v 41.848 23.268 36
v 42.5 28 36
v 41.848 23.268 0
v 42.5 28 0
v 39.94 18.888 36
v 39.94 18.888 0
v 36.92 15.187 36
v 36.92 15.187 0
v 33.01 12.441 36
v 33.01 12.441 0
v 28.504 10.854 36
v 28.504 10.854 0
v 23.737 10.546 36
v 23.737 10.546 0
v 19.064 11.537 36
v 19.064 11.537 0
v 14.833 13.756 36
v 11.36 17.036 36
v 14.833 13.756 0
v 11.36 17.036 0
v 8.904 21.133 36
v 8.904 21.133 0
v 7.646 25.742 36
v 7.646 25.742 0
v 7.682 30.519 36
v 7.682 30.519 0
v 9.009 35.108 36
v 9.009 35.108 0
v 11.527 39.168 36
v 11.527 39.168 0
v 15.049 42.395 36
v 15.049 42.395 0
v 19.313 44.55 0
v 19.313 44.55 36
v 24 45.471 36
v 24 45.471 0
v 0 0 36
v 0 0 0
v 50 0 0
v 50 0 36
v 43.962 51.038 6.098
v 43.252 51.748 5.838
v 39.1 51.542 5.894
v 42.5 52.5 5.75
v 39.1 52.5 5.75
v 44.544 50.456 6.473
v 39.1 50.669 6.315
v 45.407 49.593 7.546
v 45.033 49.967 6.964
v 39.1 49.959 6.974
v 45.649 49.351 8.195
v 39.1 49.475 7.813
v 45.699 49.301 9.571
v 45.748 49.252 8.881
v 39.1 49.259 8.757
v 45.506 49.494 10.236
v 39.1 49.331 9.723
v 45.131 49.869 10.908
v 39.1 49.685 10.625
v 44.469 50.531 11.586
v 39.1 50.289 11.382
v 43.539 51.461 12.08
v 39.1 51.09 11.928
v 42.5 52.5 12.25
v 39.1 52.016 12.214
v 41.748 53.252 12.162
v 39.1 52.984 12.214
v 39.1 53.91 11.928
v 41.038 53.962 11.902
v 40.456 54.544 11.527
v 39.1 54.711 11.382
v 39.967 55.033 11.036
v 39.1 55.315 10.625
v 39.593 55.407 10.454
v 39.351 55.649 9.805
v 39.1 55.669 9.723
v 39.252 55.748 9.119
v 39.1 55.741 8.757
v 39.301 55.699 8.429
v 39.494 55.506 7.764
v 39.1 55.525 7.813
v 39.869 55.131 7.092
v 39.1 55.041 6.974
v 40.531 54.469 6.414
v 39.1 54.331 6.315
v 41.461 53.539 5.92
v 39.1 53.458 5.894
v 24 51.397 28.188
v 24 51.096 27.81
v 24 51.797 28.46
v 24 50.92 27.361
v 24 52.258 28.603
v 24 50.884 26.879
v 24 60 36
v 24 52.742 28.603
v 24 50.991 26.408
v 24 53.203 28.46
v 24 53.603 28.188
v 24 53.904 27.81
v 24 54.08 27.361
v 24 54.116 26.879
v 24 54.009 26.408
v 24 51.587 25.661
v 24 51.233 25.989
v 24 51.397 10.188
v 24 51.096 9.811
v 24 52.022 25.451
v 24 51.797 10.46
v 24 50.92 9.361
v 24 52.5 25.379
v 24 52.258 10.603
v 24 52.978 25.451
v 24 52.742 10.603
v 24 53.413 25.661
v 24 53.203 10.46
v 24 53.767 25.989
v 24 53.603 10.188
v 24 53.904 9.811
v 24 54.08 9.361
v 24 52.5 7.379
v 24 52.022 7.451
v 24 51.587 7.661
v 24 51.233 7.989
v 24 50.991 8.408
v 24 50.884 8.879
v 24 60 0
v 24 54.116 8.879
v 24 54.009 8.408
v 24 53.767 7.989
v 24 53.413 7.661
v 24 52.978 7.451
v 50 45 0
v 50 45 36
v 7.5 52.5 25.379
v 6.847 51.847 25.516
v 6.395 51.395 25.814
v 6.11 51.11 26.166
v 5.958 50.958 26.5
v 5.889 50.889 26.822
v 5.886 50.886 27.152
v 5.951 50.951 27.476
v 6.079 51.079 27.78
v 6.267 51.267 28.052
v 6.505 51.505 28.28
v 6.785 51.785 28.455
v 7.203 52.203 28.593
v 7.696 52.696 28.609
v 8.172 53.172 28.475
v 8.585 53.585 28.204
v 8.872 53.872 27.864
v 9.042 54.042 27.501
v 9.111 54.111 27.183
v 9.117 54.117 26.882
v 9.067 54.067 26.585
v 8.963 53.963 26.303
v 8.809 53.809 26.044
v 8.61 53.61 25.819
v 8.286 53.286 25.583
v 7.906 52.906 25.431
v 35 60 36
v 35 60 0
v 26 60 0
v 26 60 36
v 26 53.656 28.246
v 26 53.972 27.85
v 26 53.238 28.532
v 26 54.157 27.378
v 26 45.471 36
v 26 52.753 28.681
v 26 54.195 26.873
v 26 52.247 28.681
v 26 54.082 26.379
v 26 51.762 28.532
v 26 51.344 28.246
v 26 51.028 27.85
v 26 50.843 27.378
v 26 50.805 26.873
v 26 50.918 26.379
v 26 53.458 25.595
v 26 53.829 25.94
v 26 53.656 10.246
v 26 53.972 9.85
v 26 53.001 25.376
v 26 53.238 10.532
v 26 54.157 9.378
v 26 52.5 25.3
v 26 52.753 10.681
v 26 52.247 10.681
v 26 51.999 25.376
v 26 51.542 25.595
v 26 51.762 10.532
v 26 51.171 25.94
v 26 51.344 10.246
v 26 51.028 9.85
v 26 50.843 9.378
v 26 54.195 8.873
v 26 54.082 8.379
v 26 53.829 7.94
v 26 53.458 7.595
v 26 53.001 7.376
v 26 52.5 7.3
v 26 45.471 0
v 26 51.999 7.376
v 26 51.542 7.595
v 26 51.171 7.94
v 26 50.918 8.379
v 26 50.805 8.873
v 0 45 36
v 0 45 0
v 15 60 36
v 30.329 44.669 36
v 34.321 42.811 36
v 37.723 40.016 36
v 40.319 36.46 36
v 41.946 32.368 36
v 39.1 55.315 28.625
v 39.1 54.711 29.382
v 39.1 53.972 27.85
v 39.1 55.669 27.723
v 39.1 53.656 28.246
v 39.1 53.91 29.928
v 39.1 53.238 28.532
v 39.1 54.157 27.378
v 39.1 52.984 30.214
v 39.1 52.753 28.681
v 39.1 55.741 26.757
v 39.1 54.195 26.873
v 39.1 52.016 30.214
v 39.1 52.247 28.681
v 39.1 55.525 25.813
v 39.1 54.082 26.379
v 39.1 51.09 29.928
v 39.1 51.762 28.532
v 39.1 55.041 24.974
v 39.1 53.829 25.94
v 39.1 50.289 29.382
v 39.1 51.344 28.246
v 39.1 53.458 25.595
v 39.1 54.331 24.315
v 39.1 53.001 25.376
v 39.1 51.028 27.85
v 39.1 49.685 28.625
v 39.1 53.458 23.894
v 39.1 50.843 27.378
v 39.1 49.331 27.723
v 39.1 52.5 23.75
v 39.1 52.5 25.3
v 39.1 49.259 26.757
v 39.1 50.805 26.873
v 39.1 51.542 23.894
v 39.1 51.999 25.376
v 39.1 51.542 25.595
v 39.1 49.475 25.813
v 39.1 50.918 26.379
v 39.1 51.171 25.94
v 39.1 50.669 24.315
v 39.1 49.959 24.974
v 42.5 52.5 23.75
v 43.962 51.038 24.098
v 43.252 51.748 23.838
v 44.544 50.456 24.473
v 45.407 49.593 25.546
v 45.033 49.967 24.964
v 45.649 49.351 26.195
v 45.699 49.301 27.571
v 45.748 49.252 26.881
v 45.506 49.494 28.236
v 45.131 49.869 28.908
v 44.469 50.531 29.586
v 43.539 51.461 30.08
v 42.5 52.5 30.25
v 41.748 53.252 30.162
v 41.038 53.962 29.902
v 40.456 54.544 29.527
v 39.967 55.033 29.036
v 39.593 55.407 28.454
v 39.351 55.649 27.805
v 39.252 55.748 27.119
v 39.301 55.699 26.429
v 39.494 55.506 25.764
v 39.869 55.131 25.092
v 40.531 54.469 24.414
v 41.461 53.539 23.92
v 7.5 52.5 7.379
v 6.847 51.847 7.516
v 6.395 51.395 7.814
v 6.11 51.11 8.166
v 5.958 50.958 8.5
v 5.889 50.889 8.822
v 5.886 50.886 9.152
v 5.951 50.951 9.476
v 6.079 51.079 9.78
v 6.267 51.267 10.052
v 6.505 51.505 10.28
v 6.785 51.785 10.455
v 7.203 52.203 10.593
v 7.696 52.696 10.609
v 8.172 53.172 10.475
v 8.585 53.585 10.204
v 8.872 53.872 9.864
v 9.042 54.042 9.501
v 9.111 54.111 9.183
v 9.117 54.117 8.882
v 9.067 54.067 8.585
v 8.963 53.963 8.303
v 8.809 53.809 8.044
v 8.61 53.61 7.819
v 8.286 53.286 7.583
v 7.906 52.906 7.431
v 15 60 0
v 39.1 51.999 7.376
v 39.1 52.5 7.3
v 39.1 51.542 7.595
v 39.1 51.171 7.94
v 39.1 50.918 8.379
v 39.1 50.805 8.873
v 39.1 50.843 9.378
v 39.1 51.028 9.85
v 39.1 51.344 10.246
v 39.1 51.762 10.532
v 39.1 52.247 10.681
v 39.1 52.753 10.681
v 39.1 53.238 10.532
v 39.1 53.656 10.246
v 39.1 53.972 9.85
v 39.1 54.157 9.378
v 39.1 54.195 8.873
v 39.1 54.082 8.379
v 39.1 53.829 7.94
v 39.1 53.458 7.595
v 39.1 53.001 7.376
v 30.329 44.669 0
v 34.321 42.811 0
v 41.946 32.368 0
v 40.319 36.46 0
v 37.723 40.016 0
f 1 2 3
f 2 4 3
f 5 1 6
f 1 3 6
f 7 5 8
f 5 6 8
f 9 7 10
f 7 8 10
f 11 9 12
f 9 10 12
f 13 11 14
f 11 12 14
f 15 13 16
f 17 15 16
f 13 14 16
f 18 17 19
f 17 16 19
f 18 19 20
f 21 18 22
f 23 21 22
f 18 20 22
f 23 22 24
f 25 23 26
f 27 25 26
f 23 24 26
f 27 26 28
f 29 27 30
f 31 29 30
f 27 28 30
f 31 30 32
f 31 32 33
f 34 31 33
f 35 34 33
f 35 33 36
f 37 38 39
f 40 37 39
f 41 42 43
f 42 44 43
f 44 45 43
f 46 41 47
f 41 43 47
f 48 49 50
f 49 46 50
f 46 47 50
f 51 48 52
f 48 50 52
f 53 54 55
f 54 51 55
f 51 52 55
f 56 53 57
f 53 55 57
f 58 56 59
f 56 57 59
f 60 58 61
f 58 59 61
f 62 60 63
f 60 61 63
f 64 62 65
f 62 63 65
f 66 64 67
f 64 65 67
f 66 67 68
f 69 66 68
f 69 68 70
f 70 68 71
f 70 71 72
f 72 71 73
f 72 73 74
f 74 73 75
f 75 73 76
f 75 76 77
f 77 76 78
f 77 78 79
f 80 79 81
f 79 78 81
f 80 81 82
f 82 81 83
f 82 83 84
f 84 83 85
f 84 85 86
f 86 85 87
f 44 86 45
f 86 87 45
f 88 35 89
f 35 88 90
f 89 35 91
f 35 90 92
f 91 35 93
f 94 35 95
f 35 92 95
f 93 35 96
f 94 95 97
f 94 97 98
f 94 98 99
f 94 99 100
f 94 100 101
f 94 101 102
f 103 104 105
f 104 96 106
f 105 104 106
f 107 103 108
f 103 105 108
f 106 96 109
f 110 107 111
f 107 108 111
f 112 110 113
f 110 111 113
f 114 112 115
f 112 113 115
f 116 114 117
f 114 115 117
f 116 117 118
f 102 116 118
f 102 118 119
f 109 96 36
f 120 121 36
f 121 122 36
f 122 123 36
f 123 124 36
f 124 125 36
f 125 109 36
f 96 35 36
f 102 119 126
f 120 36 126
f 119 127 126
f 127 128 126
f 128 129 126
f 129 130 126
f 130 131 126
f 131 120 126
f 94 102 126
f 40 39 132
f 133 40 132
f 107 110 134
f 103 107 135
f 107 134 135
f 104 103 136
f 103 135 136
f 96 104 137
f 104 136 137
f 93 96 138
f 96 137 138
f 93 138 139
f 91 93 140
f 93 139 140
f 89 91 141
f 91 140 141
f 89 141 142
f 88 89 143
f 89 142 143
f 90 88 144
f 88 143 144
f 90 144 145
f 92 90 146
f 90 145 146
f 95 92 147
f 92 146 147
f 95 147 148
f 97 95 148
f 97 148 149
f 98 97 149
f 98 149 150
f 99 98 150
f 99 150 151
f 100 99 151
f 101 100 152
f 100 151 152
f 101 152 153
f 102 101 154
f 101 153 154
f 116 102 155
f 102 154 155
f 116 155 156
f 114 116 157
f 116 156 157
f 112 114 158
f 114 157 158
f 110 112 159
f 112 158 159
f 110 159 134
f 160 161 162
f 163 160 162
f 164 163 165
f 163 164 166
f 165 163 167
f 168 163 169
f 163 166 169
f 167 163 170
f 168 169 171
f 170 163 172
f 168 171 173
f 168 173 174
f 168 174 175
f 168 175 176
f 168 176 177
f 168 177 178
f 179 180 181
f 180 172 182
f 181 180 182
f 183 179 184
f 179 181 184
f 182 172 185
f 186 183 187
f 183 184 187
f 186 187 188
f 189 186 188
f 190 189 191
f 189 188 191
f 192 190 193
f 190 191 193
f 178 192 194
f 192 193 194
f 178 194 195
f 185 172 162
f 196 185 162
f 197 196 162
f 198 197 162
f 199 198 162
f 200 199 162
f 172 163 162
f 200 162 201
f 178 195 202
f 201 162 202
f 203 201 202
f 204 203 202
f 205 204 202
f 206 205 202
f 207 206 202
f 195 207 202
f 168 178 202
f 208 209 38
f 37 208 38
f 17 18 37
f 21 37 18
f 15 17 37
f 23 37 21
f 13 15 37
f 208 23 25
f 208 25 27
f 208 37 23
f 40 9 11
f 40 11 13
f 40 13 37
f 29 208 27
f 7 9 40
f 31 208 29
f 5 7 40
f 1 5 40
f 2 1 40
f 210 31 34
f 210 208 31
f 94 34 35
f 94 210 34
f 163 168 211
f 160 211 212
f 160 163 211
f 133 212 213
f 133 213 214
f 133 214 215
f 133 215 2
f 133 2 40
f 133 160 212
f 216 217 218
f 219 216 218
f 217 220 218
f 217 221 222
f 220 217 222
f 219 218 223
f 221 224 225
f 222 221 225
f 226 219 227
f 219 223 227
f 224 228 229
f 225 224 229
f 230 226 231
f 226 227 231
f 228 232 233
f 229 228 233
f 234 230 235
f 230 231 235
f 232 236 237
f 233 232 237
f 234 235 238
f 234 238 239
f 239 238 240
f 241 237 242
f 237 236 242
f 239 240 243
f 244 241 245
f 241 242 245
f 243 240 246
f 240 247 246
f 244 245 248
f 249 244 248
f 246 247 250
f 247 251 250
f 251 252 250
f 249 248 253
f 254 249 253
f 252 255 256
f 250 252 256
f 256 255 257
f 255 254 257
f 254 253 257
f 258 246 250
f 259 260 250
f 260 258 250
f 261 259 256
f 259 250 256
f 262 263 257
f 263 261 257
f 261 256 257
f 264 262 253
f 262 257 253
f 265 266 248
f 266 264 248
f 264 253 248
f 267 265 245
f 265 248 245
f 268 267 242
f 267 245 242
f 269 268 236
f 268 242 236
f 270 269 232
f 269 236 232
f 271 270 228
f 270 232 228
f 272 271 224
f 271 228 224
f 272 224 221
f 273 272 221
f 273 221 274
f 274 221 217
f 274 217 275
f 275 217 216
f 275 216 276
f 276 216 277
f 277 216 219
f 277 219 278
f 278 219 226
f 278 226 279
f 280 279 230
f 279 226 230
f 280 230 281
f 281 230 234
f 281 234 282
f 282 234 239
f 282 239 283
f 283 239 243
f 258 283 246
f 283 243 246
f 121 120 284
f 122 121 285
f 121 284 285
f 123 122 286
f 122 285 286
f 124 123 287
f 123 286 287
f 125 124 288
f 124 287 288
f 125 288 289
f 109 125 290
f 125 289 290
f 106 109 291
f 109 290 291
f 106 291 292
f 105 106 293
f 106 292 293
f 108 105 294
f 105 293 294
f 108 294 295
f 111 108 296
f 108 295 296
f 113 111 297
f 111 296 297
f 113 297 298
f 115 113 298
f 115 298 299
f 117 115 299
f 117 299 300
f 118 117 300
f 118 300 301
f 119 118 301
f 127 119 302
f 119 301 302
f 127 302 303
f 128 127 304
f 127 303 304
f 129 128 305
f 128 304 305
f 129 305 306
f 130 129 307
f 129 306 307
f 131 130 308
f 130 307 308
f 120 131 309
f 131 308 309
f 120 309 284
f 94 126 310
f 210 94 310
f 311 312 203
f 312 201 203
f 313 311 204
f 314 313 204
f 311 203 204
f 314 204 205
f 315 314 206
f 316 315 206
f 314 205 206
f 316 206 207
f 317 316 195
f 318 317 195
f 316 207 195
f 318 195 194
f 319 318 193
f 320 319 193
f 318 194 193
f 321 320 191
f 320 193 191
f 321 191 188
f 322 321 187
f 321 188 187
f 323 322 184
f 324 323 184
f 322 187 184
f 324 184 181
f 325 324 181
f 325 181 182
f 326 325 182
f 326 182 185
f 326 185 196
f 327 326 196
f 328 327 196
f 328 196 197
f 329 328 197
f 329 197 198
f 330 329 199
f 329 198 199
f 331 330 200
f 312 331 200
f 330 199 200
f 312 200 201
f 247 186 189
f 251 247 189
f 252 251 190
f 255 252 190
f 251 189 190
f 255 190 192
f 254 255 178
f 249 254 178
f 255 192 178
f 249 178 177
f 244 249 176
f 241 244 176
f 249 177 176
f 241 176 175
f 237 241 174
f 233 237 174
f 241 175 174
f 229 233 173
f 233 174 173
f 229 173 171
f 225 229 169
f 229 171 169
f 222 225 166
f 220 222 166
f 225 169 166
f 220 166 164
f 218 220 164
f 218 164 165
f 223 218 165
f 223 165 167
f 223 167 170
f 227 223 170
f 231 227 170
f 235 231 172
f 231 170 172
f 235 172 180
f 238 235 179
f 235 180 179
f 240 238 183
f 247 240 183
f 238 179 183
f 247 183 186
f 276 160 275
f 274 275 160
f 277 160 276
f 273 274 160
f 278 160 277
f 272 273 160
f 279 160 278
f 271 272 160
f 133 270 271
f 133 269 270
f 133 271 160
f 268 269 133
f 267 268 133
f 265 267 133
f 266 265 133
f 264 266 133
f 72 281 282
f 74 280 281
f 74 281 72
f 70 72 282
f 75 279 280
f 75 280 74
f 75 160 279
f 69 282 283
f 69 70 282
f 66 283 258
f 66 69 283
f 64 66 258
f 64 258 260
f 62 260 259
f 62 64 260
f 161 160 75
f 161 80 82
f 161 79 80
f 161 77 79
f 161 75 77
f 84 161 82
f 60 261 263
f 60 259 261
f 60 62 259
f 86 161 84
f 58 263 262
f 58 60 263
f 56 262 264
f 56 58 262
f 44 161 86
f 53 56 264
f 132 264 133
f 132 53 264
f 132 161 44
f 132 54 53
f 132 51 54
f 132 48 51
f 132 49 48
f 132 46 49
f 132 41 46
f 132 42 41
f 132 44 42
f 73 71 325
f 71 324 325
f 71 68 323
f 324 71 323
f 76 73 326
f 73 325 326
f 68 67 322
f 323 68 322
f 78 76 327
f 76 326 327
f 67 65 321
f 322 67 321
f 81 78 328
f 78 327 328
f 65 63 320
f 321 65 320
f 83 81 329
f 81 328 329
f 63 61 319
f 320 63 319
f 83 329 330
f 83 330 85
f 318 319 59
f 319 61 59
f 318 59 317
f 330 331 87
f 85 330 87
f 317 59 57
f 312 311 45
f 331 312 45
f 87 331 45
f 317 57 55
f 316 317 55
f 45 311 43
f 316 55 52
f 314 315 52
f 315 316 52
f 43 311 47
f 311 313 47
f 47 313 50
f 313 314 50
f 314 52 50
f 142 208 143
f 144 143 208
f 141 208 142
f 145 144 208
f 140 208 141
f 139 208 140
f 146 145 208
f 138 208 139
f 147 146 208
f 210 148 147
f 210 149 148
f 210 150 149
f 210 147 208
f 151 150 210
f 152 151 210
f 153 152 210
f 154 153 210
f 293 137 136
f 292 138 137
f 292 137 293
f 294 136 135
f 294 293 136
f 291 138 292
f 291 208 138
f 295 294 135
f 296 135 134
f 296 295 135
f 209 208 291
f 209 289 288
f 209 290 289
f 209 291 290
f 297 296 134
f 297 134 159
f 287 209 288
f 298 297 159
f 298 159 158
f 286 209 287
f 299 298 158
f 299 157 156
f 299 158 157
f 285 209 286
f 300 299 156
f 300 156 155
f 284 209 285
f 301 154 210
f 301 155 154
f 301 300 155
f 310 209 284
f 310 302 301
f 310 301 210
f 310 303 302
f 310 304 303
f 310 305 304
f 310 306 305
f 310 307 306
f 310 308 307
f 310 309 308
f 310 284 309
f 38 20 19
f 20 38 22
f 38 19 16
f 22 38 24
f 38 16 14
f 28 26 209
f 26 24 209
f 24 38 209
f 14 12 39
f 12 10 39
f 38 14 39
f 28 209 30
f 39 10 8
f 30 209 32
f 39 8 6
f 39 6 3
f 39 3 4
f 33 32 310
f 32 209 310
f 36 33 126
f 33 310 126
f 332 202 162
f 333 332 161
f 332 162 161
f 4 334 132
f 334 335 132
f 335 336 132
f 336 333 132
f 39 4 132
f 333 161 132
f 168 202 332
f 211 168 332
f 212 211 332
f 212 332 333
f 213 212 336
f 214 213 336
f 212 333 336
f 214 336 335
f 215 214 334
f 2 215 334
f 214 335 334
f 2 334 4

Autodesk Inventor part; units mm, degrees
sketch "Skizze1" plane through (0, 0, 0) normal (0, 0, 1) x (1, 0, 0)
  line L0 (0, 0) -> (50, 0)
  line L1 (50, 0) -> (50, 45)
  line L2 (35, 60) -> (15, 60)
  line L3 (0, 45) -> (0, 0)
  circle A0 centre (25, 28) radius 17.5
  line L4 (25, 28) -> (25, 0) construction
  line L5 (0, 45) -> (15, 60)
  line L6 (35, 60) -> (50, 45)
  line L7 (24, 60) -> (26, 60)
  line L8 (26, 60) -> (26, 28)
  line L9 (26, 28) -> (24, 28)
  line L10 (24, 28) -> (24, 60)
  point P0 (50, 60)
  point P1 (0, 60)
  point P2 (25, 60)
  dimension "d0" = 50
  dimension "d1" = 35
  dimension "d2" = 60
  dimension "d3" = 15
  dimension "d4" = 15
  dimension "d5" = 15
  dimension "d6" = 15
  dimension "d7" = 28
  dimension "d10" = 2
extrude "Extrusion1" add sketch "Skizze1" along normal blind 36 contours L3 L5 L2 L10 A0 L8 L6 L1 L0 | L2 L8 A0 L10
extrude "Extrusion2" cut sketch "Skizze1" along normal up to surface (36 mm away) contours L2 L8 A0 L10 | A0 L8 L9 L10 picked at (24.8888, 33.8323)
ref_plane "Arbeitsebene1" through (42.5, 0, 0) normal (1, 0, 0) x (0, 0, -1)
sketch "Skizze3" plane through (42.5, 0, 0) normal (1, 0, 0) x (0, 0, -1)
  line L0 (0, 60) -> (-36, 60) construction
  line L1 (0, 45) -> (-36, 45) construction
  line L2 (-36, 45) -> (-36, 60) construction
  line L3 (-36, 52.5) -> (0, 52.5) construction
  line L4 (0, 45) -> (0, 60) construction
  point P0 (0, 0)
  point P1 (-18, 52.5)
  point P2 (-27, 52.5)
  point P3 (-9, 52.5)
  dimension "d44" = 9
  dimension "d45" = 9
ref_plane "Arbeitsebene2" through (0, 0, 18) normal (0, 0, 1) x (1, 0, 0)
ref_plane "Arbeitsebene3" through (0, 0, 27) normal (0, 0, 1) x (1, 0, 0)
ref_plane "Arbeitsebene4" through (0, 0, 9) normal (0, 0, -1) x (-1, 0, 0)
sketch "Skizze5" plane through (50, 0, 36) normal (1, 0, 0) x (0, 0, -1)
  line L0 (18, -12) -> (18, 72) construction
  line L1 (9, -12) -> (9, 72) construction
  line L2 (27, 72) -> (27, -12) construction
  point P0 (36, 0)
  dimension "Hole_Dist2Center" = 9
  dimension "d37" = 9
hole "Bohrung2" at (42.5, 52.5, 27) at (42.5, 52.5, 9) direction (-1, 0, 0) diameter 3.4 depth 18.5 counterbore diameter 6.5 counterbore depth 3.4 clearance for "Inbusschraube DIN EN ISO 4762" size "M3" standard "DIN"
delete faces "Fläche löschen1" heal yes whole lump no faces at (42.5, 51.6084, 27.6154) (42.5, 51.6084, 9.6154)
sketch "Skizze4" plane through (24, 45.4714, 0) normal (1, 0, 0) x (0, 0, -1)
  line L0 (-18, 7.0286) -> (-27, 7.0286) construction
  line L1 (-27, -57.4714) -> (-27, 26.5286) construction
  line L2 (-9, 26.5286) -> (-9, -57.4714) construction
  point P0 (0, -45.4714)
  point P1 (-9, 7.0286)
hole "Bohrung3" at (24, 52.5, 27) at (24, 52.5, 9) direction (-1, 0, 0) diameter 3.242 end through all thread size "M4x0.7" class "6H" standard "ISO Metric profile"
sketch "Skizze7" plane through (0, 0, 0) normal (0, 0, -1) x (-1, 0, 0)
  line L0 (-43.9281, 6.4649) -> (-5.9676, 6.4649) construction
  line L1 (0, 0) -> (-50, 0) construction
  line L2 (-25, 0) -> (-24.9479, 6.4649) construction
  line L3 (0, 45) -> (0, 0) construction
  line L4 (-50, 0) -> (-50, 45) construction
  circle A0 centre (-43.9281, 6.4649) radius 2.5 construction
  circle A1 centre (-5.9676, 6.4649) radius 2.5 construction
  dimension "d50" = 50
  dimension "d51" = 5
equation "\"d0\" = Fixation_Width"
equation "\"d4\" = d3"
equation "\"d5\" = d3"
equation "\"d6\" = d5"
equation "\"d11\" = Fixation_Thickness"
equation "\"d44\" = Hole_Dist2Center"
equation "\"d45\" = d44"
equation "\"Fixation_Thickness\" = 40"
equation "\"Fixation_Width\" = 50"
equation "\"FixationHole_Dist\" = 28"
equation "\"d21\" = -0.5 * d5"
properties part number "MotorFixation_ParallelMecha_Holder"
